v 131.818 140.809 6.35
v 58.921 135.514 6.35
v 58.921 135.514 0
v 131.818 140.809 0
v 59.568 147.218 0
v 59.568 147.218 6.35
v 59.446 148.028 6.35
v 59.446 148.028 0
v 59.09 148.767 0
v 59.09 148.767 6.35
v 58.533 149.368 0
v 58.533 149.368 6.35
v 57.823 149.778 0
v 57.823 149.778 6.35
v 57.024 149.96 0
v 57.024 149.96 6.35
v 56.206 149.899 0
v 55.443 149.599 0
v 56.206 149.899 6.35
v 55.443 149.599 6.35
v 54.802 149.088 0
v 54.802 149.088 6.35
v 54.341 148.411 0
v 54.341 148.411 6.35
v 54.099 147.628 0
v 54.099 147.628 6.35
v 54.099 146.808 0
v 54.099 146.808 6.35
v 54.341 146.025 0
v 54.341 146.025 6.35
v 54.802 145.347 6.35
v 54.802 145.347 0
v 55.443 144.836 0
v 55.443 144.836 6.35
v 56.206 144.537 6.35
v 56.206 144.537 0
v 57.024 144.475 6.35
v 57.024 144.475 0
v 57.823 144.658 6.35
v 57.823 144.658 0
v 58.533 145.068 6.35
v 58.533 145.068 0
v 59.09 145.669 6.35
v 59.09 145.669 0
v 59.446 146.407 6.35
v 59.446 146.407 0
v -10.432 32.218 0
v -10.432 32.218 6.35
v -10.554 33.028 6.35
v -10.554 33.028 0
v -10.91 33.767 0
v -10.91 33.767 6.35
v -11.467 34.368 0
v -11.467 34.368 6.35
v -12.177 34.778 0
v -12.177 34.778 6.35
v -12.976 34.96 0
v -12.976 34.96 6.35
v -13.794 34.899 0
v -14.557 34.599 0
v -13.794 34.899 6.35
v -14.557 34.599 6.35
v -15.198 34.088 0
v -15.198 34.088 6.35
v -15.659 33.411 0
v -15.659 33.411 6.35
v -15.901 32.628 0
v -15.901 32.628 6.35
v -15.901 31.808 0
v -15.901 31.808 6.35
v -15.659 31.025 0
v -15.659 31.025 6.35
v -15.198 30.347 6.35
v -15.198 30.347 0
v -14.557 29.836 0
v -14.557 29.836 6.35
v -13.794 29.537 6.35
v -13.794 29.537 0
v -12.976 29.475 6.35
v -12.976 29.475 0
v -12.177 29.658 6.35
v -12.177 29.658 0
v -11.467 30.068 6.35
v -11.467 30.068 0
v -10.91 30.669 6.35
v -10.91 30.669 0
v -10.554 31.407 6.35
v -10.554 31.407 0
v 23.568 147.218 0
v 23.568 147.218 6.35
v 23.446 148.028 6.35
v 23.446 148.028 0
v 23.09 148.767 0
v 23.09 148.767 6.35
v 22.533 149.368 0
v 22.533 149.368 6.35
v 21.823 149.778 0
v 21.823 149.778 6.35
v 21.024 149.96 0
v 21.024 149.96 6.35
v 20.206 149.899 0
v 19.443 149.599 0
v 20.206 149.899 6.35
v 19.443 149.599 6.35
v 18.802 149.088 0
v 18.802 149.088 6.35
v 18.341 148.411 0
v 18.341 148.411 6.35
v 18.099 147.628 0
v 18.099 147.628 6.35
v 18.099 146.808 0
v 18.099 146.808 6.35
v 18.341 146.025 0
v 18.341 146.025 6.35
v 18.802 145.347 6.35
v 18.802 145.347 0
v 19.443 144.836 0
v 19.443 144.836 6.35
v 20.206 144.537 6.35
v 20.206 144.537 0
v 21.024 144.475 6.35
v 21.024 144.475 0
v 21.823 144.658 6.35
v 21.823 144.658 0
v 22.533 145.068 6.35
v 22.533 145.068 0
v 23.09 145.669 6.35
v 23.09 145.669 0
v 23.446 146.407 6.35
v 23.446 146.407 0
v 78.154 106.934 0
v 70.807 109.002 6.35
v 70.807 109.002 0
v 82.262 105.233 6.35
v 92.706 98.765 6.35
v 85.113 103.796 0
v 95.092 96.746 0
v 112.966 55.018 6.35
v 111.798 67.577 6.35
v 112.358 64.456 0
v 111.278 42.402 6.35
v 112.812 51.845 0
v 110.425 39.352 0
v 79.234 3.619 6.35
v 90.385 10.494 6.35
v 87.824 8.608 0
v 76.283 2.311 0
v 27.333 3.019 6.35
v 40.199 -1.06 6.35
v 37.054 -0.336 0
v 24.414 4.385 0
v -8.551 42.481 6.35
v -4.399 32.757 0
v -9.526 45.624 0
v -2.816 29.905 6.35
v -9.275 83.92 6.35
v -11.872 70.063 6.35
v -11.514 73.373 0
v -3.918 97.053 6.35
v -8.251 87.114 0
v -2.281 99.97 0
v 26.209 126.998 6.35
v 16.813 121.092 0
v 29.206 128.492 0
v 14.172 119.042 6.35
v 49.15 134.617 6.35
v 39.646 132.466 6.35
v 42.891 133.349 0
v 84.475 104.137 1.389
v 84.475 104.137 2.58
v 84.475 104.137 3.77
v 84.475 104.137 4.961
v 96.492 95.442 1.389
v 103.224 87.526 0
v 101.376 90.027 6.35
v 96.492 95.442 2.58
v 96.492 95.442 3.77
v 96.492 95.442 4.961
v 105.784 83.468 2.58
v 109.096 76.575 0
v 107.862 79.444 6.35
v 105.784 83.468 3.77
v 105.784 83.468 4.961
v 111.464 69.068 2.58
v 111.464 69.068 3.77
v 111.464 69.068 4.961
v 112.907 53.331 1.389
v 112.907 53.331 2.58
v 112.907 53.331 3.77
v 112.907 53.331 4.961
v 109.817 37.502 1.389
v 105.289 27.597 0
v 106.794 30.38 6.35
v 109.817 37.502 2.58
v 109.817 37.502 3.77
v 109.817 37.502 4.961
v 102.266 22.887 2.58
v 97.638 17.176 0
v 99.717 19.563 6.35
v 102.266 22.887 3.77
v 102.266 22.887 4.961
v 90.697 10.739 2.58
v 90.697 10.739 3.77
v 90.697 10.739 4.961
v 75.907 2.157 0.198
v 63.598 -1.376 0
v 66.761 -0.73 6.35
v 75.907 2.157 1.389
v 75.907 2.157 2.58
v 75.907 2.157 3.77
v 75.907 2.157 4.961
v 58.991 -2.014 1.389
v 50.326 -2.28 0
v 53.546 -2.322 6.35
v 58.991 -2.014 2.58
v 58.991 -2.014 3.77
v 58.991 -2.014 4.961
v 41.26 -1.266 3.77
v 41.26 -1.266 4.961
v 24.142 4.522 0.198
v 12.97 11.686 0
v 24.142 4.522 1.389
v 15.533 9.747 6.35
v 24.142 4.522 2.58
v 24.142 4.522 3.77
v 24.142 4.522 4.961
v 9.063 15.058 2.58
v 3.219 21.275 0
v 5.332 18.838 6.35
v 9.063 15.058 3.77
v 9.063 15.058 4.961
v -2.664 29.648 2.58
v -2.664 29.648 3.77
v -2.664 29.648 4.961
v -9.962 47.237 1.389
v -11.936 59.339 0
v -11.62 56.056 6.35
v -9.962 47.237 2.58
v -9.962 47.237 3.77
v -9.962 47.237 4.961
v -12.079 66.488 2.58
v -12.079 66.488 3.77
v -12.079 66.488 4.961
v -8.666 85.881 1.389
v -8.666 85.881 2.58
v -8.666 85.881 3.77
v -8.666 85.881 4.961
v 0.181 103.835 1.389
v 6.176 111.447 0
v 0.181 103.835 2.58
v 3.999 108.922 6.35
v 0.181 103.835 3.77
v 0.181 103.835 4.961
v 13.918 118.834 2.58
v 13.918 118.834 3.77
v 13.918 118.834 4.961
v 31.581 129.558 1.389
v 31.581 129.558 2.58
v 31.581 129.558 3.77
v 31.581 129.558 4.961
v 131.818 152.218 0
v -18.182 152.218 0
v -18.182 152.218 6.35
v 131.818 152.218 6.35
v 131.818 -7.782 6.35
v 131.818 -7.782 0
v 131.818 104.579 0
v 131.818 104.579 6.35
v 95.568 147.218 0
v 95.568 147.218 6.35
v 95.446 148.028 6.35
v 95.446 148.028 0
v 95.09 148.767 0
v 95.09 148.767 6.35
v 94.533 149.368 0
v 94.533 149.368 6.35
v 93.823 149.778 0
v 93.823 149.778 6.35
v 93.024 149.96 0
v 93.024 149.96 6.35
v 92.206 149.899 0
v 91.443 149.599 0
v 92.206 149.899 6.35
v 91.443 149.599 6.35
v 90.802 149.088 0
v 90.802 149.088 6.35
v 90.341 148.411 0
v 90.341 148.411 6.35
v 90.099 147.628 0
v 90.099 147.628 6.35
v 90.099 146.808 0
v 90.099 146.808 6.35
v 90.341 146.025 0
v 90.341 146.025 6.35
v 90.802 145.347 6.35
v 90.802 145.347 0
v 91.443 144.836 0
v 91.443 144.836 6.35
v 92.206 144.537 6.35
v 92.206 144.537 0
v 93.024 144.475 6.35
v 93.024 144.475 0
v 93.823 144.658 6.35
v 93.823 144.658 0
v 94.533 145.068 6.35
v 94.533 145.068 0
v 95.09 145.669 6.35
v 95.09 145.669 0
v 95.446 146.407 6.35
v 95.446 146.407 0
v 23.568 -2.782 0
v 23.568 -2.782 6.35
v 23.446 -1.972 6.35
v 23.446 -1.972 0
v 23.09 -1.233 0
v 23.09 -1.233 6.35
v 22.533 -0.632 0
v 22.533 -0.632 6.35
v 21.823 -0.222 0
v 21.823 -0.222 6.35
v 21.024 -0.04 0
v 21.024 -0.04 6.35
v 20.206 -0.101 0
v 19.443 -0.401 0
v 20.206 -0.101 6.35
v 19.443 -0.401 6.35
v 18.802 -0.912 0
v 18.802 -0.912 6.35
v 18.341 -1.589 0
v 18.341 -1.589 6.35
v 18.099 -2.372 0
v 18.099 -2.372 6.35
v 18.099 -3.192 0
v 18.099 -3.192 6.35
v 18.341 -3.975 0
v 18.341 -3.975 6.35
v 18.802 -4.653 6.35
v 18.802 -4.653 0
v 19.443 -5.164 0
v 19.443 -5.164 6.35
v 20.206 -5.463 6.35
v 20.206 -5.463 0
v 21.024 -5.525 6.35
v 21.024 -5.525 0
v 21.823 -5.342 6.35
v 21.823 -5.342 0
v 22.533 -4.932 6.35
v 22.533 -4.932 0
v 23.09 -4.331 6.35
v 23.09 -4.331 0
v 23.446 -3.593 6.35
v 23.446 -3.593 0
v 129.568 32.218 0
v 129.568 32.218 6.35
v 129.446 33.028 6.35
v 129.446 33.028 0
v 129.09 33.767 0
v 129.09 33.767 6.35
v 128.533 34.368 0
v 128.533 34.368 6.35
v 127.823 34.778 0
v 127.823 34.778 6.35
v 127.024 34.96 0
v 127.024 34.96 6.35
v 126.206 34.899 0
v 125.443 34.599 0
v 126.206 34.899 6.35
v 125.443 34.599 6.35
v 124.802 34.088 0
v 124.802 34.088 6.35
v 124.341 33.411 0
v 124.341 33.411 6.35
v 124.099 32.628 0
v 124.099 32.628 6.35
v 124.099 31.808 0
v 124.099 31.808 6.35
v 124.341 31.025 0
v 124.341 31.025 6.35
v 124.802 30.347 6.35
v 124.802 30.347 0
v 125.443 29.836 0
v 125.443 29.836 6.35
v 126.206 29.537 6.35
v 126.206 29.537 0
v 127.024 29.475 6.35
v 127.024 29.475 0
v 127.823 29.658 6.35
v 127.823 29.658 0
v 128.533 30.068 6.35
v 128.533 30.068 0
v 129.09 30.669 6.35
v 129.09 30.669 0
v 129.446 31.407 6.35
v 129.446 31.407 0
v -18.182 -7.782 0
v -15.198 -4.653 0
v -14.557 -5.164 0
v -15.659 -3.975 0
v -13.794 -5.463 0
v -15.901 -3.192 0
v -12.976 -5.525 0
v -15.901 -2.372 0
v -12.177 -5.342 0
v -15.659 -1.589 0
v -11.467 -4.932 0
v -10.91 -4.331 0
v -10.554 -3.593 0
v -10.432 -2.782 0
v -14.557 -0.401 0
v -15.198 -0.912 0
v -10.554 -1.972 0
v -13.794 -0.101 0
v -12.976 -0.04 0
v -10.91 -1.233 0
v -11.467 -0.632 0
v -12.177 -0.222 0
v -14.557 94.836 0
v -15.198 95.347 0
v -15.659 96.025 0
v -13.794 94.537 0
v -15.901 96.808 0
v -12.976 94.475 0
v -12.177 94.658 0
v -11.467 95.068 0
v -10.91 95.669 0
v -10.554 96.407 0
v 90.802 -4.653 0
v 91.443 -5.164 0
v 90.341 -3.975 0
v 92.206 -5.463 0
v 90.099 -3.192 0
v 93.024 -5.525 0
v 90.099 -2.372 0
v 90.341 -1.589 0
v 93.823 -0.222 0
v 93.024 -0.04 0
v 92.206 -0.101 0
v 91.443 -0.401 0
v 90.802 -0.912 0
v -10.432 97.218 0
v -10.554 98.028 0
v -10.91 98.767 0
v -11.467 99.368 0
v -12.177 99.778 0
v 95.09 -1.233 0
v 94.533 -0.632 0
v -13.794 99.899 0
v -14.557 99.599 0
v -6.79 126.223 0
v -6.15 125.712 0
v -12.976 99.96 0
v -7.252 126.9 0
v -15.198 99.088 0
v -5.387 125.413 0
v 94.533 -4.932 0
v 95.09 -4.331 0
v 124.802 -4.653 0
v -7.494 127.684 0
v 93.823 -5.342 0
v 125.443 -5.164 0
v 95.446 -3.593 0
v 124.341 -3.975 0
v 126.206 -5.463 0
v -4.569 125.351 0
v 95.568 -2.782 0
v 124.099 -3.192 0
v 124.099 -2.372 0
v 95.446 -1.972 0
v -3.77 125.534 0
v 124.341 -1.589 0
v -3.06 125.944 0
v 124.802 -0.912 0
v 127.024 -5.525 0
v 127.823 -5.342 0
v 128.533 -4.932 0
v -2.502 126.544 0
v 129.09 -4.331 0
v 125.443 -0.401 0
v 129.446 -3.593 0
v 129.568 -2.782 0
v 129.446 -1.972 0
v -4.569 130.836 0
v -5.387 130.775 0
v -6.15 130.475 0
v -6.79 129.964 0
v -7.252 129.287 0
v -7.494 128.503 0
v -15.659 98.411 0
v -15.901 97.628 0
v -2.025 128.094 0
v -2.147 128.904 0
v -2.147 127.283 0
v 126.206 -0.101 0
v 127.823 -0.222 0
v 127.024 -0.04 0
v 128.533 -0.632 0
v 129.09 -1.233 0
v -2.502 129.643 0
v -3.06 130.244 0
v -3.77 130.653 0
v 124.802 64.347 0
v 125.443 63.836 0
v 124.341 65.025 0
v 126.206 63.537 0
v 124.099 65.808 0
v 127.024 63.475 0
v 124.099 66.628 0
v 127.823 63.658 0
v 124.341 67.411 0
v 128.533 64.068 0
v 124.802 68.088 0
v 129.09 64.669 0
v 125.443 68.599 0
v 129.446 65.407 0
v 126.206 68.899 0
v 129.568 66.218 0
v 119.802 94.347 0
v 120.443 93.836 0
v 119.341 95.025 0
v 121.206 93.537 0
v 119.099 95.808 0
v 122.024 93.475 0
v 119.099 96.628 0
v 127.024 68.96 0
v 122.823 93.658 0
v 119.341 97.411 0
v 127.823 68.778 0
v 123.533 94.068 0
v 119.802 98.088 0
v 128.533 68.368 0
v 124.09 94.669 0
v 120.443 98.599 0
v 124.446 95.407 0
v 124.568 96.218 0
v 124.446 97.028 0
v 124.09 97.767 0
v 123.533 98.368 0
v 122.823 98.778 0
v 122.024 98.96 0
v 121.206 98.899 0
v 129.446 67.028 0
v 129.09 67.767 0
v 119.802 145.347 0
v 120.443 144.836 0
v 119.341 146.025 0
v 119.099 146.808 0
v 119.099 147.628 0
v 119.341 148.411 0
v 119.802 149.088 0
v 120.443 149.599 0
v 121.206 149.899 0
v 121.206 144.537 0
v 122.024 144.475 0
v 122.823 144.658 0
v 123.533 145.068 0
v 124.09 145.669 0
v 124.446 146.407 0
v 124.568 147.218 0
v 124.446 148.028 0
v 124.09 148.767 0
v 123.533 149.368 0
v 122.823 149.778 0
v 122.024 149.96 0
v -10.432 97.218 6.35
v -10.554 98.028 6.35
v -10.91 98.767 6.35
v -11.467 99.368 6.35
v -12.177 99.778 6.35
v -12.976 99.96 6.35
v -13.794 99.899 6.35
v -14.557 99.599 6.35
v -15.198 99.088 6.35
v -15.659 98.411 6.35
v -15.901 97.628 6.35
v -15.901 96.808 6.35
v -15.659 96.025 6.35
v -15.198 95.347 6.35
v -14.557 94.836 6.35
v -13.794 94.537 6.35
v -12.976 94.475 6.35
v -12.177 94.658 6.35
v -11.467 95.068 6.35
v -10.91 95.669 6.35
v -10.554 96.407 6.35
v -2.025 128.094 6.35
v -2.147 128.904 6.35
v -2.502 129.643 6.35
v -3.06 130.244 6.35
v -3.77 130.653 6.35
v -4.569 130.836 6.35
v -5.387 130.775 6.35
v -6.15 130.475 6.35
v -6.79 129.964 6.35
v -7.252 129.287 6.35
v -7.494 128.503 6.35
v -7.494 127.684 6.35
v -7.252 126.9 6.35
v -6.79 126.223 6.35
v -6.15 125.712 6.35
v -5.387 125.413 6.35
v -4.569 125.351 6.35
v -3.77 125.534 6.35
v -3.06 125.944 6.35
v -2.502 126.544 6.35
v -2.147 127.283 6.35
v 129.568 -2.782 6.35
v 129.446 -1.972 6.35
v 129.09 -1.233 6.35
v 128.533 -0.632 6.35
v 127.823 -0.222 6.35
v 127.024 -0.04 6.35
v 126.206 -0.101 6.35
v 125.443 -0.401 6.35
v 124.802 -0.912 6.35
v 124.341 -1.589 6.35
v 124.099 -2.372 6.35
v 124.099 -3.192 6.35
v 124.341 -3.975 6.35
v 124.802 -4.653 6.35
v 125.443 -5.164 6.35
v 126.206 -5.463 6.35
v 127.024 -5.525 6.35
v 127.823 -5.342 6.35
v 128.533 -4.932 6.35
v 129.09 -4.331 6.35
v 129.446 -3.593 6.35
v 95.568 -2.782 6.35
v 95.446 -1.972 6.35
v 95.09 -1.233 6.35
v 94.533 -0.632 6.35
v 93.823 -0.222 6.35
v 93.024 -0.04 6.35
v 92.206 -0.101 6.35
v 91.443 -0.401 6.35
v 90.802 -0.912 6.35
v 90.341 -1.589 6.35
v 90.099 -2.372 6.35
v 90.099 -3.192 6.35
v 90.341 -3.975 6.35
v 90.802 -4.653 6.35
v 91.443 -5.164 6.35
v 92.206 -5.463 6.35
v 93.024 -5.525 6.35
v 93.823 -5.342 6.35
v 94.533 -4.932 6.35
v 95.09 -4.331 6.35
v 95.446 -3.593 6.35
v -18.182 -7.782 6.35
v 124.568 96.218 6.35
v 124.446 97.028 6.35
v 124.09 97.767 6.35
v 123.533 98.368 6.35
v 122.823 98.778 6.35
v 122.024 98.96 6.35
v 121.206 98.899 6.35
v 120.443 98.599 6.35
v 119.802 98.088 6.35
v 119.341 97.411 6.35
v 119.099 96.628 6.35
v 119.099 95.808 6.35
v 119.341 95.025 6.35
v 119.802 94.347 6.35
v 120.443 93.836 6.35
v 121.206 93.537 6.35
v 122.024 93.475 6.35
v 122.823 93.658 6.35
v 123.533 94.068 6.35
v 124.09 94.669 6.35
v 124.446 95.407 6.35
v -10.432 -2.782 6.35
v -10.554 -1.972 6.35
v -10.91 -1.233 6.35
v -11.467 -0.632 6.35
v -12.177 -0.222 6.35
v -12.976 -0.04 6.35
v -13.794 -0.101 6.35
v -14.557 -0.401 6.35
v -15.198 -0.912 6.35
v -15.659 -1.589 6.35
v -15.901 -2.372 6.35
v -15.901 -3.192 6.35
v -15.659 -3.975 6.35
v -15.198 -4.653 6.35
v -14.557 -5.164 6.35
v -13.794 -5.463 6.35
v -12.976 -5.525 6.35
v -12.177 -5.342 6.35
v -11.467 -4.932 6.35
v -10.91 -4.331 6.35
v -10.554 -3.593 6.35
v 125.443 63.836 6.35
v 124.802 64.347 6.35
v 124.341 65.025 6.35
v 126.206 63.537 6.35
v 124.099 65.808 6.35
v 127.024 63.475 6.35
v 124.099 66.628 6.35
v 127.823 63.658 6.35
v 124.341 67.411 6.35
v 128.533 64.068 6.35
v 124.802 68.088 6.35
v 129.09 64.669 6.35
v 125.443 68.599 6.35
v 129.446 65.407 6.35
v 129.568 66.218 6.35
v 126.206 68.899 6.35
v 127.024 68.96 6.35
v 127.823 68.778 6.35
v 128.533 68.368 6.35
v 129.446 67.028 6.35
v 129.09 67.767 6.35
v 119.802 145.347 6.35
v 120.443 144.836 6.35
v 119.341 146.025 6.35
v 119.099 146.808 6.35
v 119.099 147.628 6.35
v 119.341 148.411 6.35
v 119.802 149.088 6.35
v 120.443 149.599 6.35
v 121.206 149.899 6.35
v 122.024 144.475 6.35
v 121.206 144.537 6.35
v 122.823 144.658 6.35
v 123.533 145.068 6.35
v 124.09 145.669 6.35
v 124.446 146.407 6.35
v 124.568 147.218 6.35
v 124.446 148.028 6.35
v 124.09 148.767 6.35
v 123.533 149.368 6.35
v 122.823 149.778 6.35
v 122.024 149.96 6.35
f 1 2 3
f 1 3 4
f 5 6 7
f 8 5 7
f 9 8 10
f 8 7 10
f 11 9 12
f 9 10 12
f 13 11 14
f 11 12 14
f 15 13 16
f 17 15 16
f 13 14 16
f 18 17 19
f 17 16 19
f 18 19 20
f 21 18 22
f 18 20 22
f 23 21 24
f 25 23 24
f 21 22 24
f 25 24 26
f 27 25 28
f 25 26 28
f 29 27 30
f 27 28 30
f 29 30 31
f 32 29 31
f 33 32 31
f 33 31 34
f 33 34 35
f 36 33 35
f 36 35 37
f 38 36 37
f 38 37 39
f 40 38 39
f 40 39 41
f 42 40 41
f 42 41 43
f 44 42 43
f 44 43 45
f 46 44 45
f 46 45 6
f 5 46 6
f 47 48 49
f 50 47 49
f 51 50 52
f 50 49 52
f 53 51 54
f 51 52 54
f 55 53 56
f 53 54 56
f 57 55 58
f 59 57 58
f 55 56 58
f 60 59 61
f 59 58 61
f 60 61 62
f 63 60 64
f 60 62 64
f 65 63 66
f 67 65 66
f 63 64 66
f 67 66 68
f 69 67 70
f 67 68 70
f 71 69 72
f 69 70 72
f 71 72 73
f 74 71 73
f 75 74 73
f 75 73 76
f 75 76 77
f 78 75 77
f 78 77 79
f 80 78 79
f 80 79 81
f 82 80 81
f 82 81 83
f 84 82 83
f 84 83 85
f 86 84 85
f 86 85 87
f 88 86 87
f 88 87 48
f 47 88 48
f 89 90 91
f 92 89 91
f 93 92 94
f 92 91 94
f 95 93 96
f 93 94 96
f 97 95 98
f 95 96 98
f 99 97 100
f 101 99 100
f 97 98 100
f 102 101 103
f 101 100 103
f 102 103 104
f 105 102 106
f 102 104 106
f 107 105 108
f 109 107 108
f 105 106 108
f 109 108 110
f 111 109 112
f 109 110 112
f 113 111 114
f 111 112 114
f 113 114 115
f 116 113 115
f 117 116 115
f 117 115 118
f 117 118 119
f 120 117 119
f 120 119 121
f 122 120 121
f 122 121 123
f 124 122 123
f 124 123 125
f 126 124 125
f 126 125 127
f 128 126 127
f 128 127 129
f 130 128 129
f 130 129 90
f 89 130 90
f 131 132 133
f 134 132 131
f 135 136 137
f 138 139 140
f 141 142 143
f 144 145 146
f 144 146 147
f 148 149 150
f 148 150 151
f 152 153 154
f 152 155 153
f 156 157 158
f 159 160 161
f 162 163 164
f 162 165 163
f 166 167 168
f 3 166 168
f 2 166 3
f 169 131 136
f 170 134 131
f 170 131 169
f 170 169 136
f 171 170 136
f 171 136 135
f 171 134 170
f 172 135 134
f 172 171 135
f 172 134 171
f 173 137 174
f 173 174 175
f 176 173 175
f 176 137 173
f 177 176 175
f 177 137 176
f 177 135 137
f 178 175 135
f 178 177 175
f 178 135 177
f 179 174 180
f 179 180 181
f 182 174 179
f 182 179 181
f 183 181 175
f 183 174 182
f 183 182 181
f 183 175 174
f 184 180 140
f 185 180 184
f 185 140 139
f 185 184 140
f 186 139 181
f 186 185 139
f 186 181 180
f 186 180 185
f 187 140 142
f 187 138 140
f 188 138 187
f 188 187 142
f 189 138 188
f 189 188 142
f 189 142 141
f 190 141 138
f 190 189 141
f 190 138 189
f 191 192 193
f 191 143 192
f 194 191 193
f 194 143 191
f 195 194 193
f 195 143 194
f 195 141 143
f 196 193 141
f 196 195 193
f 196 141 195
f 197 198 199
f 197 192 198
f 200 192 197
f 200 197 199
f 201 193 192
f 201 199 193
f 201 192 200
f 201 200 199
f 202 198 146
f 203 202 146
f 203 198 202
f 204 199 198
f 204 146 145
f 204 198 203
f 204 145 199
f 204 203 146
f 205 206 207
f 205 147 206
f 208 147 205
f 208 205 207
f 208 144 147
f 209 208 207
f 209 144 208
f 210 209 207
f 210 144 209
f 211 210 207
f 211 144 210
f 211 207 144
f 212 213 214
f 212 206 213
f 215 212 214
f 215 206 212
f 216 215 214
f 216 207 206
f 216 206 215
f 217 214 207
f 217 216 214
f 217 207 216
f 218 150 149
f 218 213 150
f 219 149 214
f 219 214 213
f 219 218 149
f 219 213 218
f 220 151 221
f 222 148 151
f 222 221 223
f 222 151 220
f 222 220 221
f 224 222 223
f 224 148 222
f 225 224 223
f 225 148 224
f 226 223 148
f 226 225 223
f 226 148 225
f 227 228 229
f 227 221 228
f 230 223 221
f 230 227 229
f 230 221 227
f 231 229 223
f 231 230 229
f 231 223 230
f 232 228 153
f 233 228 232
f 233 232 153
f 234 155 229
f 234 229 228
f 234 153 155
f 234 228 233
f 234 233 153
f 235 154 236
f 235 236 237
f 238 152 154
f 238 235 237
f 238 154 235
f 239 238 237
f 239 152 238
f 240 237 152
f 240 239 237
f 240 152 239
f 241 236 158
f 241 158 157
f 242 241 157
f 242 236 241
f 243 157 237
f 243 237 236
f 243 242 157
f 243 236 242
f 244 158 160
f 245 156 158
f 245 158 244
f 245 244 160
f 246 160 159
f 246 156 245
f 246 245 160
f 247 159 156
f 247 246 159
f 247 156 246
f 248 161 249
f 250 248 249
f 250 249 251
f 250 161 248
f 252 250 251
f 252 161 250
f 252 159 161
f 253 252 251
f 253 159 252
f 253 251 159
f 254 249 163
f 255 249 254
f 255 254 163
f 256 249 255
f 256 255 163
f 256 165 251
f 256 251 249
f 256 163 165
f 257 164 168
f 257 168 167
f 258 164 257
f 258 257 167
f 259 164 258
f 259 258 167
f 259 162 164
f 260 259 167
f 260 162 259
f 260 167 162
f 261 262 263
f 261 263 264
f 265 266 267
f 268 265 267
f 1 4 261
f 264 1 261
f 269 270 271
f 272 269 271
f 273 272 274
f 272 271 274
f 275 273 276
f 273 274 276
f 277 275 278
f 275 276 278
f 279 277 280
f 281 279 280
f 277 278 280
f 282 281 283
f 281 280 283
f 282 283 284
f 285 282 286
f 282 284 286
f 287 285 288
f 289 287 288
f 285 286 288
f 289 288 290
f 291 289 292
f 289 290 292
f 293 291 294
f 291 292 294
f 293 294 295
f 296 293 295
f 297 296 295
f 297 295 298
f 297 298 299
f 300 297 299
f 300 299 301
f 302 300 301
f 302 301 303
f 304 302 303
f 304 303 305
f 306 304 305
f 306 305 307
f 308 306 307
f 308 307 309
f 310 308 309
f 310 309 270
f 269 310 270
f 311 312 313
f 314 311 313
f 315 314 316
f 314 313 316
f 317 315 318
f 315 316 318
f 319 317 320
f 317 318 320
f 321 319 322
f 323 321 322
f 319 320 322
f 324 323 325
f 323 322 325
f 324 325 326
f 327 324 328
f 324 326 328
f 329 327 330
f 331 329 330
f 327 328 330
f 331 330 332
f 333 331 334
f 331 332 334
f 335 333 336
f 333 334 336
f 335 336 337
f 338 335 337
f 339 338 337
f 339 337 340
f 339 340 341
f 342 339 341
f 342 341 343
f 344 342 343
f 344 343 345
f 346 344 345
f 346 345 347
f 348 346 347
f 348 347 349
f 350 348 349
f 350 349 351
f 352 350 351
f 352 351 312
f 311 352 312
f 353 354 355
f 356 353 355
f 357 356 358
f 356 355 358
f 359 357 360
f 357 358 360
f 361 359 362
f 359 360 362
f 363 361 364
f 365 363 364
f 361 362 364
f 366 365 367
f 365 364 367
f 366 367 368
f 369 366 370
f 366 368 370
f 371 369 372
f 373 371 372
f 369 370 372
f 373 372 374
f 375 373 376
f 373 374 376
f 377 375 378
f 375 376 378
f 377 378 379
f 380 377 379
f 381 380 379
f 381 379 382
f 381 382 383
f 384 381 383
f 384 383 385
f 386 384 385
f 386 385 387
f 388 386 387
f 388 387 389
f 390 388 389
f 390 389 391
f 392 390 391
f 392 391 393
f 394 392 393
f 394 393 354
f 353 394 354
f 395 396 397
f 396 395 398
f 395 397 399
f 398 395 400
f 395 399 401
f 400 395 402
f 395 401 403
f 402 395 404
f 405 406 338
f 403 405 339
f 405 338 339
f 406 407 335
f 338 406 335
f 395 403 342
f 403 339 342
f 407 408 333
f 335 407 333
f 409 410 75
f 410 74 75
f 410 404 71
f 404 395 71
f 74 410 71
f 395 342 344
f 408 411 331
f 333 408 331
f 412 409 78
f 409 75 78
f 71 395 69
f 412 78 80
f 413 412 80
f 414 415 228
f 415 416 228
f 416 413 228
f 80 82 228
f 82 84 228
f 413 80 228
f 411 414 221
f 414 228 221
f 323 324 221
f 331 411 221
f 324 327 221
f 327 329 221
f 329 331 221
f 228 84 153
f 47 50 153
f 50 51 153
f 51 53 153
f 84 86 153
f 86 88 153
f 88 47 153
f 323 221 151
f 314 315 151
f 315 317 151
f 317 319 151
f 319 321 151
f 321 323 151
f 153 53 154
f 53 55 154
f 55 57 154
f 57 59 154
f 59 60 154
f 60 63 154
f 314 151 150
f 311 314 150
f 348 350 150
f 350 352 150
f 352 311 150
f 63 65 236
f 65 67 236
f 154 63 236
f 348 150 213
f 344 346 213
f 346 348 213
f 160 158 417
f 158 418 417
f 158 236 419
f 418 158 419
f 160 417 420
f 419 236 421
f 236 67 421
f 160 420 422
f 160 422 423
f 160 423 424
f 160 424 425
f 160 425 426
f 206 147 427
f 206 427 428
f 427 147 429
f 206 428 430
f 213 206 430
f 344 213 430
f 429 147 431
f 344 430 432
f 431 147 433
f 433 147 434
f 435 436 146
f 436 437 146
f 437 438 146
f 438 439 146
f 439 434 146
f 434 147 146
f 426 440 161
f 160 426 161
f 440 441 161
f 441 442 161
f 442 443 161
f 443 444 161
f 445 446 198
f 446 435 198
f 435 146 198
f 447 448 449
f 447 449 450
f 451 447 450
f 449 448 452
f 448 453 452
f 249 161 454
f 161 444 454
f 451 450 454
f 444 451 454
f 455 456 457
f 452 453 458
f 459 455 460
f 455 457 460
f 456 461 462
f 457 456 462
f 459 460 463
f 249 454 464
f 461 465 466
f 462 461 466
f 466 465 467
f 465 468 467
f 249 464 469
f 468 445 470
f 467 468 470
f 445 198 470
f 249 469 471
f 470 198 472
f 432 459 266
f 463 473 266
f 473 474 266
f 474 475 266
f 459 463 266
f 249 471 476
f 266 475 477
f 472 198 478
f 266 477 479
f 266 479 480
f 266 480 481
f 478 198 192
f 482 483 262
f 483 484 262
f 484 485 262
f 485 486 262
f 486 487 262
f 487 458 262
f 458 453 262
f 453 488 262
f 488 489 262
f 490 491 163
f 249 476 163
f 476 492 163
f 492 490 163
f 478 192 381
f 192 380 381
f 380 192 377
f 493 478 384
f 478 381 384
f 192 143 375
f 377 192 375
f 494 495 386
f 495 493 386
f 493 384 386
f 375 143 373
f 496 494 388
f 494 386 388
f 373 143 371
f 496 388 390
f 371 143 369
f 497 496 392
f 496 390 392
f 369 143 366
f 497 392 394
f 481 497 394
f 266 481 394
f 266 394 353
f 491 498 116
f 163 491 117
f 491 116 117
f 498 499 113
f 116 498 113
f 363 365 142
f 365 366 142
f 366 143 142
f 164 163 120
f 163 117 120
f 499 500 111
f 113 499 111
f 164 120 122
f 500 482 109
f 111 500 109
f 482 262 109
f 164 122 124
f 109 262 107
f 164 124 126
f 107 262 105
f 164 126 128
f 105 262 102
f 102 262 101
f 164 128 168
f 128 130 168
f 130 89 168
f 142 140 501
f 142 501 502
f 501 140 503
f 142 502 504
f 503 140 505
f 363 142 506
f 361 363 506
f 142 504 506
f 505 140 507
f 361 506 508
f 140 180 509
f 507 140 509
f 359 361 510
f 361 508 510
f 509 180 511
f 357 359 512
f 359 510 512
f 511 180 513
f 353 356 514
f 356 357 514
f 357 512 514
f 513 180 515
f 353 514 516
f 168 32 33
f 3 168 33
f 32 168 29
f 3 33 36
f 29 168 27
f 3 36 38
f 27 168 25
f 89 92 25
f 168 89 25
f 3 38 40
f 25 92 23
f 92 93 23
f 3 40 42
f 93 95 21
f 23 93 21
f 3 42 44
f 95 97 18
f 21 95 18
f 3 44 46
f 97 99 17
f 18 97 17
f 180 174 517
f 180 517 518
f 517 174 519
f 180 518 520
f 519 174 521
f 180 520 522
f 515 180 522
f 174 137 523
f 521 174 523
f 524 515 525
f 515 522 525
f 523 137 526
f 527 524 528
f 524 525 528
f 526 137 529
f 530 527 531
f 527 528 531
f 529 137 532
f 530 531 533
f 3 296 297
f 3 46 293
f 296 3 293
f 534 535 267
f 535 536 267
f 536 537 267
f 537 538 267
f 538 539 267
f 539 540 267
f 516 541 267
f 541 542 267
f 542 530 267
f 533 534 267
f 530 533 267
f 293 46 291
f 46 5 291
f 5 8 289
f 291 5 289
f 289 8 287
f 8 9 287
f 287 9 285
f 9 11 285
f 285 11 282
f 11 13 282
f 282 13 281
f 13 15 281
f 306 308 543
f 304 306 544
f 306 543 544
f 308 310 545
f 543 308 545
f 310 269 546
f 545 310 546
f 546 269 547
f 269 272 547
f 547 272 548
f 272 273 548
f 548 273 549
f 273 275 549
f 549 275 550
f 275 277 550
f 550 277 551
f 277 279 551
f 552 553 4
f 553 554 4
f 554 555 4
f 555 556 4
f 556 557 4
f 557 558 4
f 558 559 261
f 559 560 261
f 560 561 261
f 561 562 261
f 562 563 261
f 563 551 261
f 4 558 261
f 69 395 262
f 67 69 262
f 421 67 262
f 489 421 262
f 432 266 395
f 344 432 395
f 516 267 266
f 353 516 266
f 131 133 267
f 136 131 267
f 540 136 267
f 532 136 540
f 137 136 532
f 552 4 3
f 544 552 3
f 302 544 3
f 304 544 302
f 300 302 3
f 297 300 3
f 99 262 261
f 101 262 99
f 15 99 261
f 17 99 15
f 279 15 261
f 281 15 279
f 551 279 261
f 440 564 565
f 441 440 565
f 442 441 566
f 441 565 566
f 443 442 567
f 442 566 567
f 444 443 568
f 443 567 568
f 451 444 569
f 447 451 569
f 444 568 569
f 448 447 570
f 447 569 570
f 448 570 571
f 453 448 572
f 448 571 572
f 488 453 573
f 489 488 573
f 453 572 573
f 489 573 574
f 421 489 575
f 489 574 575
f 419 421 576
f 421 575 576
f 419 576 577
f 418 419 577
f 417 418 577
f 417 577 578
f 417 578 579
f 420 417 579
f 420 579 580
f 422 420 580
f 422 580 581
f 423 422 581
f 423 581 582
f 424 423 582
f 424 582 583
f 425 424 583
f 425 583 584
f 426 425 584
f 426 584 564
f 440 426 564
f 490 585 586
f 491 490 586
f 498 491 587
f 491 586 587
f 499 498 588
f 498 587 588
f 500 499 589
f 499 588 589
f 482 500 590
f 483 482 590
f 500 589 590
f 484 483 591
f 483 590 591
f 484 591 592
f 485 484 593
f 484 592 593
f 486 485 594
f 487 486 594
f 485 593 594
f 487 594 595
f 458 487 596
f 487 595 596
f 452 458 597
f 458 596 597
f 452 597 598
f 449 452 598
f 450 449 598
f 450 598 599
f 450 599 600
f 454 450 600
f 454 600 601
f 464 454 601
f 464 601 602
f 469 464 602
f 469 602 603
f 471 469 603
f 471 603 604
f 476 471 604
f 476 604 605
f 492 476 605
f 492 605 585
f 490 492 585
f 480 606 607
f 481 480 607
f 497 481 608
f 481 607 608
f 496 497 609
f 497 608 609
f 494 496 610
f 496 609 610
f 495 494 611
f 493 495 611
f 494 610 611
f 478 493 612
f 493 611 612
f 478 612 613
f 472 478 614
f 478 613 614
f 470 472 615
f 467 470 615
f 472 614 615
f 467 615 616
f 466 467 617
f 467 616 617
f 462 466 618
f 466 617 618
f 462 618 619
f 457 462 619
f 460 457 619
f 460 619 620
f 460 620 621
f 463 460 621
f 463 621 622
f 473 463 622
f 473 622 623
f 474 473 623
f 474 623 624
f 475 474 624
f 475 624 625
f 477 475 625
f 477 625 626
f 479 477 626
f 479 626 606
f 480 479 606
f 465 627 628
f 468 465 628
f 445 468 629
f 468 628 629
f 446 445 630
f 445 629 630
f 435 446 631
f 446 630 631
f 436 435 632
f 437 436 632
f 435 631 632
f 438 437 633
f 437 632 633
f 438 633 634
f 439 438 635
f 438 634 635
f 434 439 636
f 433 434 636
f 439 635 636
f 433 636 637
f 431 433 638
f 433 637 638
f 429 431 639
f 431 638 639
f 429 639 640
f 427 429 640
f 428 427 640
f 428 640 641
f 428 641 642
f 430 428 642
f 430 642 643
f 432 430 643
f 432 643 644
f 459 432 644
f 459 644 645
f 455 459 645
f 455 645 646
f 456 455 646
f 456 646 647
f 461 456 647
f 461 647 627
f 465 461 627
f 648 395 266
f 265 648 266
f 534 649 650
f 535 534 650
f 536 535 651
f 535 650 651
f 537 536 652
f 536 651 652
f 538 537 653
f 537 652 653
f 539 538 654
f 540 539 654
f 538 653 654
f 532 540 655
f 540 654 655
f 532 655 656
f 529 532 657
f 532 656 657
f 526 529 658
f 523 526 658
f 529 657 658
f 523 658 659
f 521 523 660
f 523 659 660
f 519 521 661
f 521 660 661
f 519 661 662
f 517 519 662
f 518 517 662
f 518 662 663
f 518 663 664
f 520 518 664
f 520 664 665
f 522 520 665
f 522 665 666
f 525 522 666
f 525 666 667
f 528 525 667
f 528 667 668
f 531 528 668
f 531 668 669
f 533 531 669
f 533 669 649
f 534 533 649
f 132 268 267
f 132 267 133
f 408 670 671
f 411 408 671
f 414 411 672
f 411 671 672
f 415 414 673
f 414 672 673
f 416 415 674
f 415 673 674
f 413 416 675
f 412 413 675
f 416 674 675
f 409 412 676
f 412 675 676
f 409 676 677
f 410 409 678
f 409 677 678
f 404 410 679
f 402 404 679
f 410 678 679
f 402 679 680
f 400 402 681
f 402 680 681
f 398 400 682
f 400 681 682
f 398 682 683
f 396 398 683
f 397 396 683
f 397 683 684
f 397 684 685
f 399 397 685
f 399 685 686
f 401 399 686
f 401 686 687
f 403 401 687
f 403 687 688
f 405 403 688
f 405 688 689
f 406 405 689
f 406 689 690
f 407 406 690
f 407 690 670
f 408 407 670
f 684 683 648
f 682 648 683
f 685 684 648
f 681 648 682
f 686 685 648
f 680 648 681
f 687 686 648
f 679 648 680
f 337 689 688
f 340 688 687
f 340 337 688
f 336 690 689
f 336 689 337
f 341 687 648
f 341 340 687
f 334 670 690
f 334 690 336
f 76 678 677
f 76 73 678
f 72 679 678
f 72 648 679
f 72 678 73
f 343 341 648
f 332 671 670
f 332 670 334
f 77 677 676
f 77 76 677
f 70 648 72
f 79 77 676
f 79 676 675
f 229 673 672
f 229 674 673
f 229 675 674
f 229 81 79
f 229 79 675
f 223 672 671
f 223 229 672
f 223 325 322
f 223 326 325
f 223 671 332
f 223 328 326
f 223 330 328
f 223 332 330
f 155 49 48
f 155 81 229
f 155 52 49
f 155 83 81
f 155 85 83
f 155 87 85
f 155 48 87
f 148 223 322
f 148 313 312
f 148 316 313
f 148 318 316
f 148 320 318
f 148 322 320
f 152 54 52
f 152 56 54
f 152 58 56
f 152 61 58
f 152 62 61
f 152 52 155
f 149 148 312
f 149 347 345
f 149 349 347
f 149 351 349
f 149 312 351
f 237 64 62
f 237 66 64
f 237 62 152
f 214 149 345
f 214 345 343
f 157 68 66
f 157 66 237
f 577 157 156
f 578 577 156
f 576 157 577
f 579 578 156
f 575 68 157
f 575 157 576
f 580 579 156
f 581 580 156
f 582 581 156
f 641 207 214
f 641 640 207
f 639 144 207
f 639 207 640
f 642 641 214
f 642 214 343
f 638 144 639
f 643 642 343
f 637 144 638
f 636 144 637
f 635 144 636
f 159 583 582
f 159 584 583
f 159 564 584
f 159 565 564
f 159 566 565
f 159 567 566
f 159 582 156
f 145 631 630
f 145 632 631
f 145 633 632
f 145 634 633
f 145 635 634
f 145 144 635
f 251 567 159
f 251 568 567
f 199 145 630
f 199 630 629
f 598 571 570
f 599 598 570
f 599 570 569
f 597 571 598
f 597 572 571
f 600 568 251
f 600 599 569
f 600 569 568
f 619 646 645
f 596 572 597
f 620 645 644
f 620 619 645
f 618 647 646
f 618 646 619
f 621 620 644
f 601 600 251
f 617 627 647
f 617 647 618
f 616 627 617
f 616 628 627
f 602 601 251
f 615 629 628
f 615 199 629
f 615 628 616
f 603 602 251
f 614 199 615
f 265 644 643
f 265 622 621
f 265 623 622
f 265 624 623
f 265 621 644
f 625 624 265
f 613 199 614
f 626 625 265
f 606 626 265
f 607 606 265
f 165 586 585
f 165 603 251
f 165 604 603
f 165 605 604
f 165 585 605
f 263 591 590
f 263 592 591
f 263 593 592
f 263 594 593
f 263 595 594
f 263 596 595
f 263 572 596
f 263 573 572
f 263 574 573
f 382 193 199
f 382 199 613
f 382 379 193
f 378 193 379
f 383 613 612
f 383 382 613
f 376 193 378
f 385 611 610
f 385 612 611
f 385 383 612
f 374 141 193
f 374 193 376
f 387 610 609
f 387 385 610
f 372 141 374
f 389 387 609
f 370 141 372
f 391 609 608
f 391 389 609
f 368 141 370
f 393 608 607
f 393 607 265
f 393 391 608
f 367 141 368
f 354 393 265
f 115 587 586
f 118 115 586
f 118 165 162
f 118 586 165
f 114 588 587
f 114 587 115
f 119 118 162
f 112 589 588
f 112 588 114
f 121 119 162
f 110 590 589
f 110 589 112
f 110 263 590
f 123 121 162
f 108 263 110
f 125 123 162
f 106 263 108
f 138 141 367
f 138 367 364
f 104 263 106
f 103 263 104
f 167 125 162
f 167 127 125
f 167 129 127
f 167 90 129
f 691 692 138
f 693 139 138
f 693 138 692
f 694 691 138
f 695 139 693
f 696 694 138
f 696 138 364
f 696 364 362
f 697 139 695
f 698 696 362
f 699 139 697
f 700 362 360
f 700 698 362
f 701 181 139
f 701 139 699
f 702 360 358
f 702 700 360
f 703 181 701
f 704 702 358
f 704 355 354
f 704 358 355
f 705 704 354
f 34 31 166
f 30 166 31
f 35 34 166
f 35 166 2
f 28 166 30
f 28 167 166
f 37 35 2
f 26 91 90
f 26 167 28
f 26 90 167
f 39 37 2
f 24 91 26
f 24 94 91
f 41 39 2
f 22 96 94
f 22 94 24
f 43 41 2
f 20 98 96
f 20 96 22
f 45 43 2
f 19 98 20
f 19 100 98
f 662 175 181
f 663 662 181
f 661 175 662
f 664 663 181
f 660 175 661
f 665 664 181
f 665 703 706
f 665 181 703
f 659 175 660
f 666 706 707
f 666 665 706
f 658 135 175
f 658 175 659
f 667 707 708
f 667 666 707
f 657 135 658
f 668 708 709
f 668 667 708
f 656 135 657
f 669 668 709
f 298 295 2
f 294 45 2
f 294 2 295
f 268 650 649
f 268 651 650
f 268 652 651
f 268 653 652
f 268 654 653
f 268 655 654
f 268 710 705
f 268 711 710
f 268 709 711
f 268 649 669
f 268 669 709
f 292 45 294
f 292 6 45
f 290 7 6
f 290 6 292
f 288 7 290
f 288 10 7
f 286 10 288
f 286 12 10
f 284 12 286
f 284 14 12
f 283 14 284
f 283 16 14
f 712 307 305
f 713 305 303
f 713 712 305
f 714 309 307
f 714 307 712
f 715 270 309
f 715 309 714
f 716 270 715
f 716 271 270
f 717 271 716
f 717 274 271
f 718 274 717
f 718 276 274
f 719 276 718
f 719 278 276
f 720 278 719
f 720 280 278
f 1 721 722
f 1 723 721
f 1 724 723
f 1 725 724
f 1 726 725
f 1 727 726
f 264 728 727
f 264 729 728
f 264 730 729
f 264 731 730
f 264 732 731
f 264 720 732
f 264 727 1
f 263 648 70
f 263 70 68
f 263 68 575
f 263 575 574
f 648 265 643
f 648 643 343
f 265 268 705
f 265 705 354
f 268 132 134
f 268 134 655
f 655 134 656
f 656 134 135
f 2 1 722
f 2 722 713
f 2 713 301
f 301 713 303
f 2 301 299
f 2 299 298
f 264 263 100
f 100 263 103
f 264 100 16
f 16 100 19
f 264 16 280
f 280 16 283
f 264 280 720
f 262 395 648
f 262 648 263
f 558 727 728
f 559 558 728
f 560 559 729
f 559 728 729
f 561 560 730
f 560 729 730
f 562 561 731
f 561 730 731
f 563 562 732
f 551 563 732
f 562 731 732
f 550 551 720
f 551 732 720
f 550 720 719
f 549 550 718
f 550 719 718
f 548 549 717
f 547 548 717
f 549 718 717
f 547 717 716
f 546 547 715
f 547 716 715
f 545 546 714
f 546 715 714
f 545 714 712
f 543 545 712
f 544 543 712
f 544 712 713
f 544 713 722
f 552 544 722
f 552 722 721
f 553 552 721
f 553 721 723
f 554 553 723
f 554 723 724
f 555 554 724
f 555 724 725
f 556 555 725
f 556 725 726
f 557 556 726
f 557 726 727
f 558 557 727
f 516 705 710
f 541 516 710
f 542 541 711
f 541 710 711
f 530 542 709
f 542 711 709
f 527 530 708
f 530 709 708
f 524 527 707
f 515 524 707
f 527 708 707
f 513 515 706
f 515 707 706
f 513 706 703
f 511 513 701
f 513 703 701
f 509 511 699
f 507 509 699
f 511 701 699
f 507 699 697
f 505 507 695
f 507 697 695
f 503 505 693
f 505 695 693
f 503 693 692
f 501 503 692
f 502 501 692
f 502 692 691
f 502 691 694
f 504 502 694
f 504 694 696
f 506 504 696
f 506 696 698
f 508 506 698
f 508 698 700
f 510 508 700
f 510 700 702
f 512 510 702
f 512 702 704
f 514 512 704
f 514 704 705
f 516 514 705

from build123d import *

# Parameters (mm, degrees)
SKETCH1_W           = 150
SKETCH1_H           = 160
BOSS_EXTRUDE1_DEPTH = 6.35
CUT_EXTRUDE2_REACH  = 8.35
SKETCH2_R           = 50
CUT_EXTRUDE3_REACH  = 8.35
CUT_EXTRUDE4_REACH  = 8.35
SKETCH9_R           = 2.75


with BuildPart() as part:
    # Sketch1 → Boss-Extrude1 (new body)
    with BuildSketch(Plane.XY):
        with Locations((56.818174671, 72.21769967)):
            Rectangle(SKETCH1_W, SKETCH1_H)
    extrude(amount=BOSS_EXTRUDE1_DEPTH)

    # Sketch2 → Cut-Extrude2 (cut, up to next)
    with BuildSketch(Plane.XY, mode=Mode.PRIVATE) as cut_extrude2_sk1:
        with Locations((56.818174671, 60.21769967)):
            Circle(SKETCH2_R)
    cut_extrude2_tool1 = extrude(cut_extrude2_sk1.sketch, amount=CUT_EXTRUDE2_REACH, mode=Mode.PRIVATE) & part.part
    add(cut_extrude2_tool1.solids().sort_by_distance((56.818175, 60.2177, 0))[0], mode=Mode.SUBTRACT)

    # Sketch8 → Cut-Extrude3 (cut, up to next)
    with BuildSketch(Plane.XY.offset(6.35), mode=Mode.PRIVATE) as cut_extrude3_sk1:
        with BuildLine():
            Line((58.92140003, 135.514331195), (131.818174671, 140.809388743))
            Line((131.818174671, 140.809388743), (131.818174671, 104.578808843))
            Line((131.818174671, 104.578808843), (70.806770479, 109.001730739))
            add(Edge.make_bspline(
                [(70.806770479, 109.001730739), (73.942524714, 108.368884336), (77.04178439, 107.432911602), (83.051183235, 104.970960127), (85.961176799, 103.444994734), (91.479272622, 99.84171719), (94.08723275, 97.764446671), (98.896476379, 93.118835241), (101.097626722, 90.550563372), (105.000601765, 85.003178114), (106.702307564, 82.024159237), (109.529682116, 75.752999351), (110.655251092, 72.460975365), (112.272876974, 65.675829551), (112.764857474, 62.18284337), (113.079726502, 55.118296179), (112.902565452, 51.546884758), (111.867369097, 44.454211174), (111.009313557, 40.93310722), (108.625399649, 34.071335338), (107.099551849, 30.730828472), (103.418128221, 24.357288168), (101.262594088, 21.324412639), (96.384092178, 15.685114778), (93.661196375, 13.078841183), (87.732775622, 8.399046081), (84.527350913, 6.325658336), (77.738594716, 2.80099297), (74.155388616, 1.34982877), (66.732312128, -0.861700607), (62.892588137, -1.621977418), (55.090144524, -2.406756839), (51.127587291, -2.431200011), (43.220919756, -1.725282069), (39.276982107, -0.994893308), (31.551721516, 1.212456983), (27.77057526, 2.689412638), (20.512525514, 6.354071351), (17.035796228, 8.541734506), (10.520379708, 13.56507488), (7.481857639, 16.400678926), (1.963709861, 22.631960147), (-0.515766072, 26.027532897), (-4.812661012, 33.268276111), (-6.629951535, 37.113314132), (-9.521205366, 45.123544829), (-10.595066712, 49.288581387), (-11.94355863, 57.794744944), (-12.218118102, 62.135697466), (-11.940081486, 70.8399882), (-11.387448434, 75.203139684), (-9.456713485, 83.793925735), (-8.078610826, 88.021368007), (-4.52880765, 96.184347178), (-2.357143331, 100.119693237), (2.718257783, 107.549380476), (5.621922023, 111.043539373), (12.071778181, 117.454666429), (15.617863156, 120.371467783), (23.237698029, 125.509870744), (27.311309881, 127.731327501), (35.849706709, 131.383908814), (40.314327037, 132.814916259), (49.481179121, 134.818294383), (54.183225201, 135.390580553), (58.92140003, 135.514331195)],
                knots=[0, 0, 0, 0, 0.03125, 0.03125, 0.0625, 0.0625, 0.09375, 0.09375, 0.125, 0.125, 0.15625, 0.15625, 0.1875, 0.1875, 0.21875, 0.21875, 0.25, 0.25, 0.28125, 0.28125, 0.3125, 0.3125, 0.34375, 0.34375, 0.375, 0.375, 0.40625, 0.40625, 0.4375, 0.4375, 0.46875, 0.46875, 0.5, 0.5, 0.53125, 0.53125, 0.5625, 0.5625, 0.59375, 0.59375, 0.625, 0.625, 0.65625, 0.65625, 0.6875, 0.6875, 0.71875, 0.71875, 0.75, 0.75, 0.78125, 0.78125, 0.8125, 0.8125, 0.84375, 0.84375, 0.875, 0.875, 0.90625, 0.90625, 0.9375, 0.9375, 0.96875, 0.96875, 1, 1, 1, 1], degree=3))
        make_face()
    cut_extrude3_tool1 = extrude(cut_extrude3_sk1.sketch, amount=-CUT_EXTRUDE3_REACH, mode=Mode.PRIVATE) & part.part
    add(cut_extrude3_tool1.solids().sort_by_distance((56.233786, 70.895416, 6.35))[0], mode=Mode.SUBTRACT)

    # Sketch9 → Cut-Extrude4 (cut, up to next)
    with BuildSketch(Plane.XY.offset(6.35), mode=Mode.PRIVATE) as cut_extrude4_sk1:
        with Locations((121.818174671, 147.21769967)):
            Circle(SKETCH9_R)
    cut_extrude4_tool1 = extrude(cut_extrude4_sk1.sketch, amount=-CUT_EXTRUDE4_REACH, mode=Mode.PRIVATE) & part.part
    add(cut_extrude4_tool1.solids().sort_by_distance((121.818175, 147.2177, 6.35))[0], mode=Mode.SUBTRACT)
    # Sketch9 → Cut-Extrude4 (cut, up to next)
    with BuildSketch(Plane.XY.offset(6.35), mode=Mode.PRIVATE) as cut_extrude4_sk2:
        with Locations((92.818174671, 147.21769967)):
            Circle(SKETCH9_R)
    cut_extrude4_tool2 = extrude(cut_extrude4_sk2.sketch, amount=-CUT_EXTRUDE4_REACH, mode=Mode.PRIVATE) & part.part
    add(cut_extrude4_tool2.solids().sort_by_distance((92.818175, 147.2177, 6.35))[0], mode=Mode.SUBTRACT)
    # Sketch9 → Cut-Extrude4 (cut, up to next)
    with BuildSketch(Plane.XY.offset(6.35), mode=Mode.PRIVATE) as cut_extrude4_sk3:
        with Locations((56.818174671, 147.21769967)):
            Circle(SKETCH9_R)
    cut_extrude4_tool3 = extrude(cut_extrude4_sk3.sketch, amount=-CUT_EXTRUDE4_REACH, mode=Mode.PRIVATE) & part.part
    add(cut_extrude4_tool3.solids().sort_by_distance((56.818175, 147.2177, 6.35))[0], mode=Mode.SUBTRACT)
    # Sketch9 → Cut-Extrude4 (cut, up to next)
    with BuildSketch(Plane.XY.offset(6.35), mode=Mode.PRIVATE) as cut_extrude4_sk4:
        with Locations((20.818174671, 147.21769967)):
            Circle(SKETCH9_R)
    cut_extrude4_tool4 = extrude(cut_extrude4_sk4.sketch, amount=-CUT_EXTRUDE4_REACH, mode=Mode.PRIVATE) & part.part
    add(cut_extrude4_tool4.solids().sort_by_distance((20.818175, 147.2177, 6.35))[0], mode=Mode.SUBTRACT)
    # Sketch9 → Cut-Extrude4 (cut, up to next)
    with BuildSketch(Plane.XY.offset(6.35), mode=Mode.PRIVATE) as cut_extrude4_sk5:
        with Locations((-4.774596198, 128.093555907)):
            Circle(SKETCH9_R)
    cut_extrude4_tool5 = extrude(cut_extrude4_sk5.sketch, amount=-CUT_EXTRUDE4_REACH, mode=Mode.PRIVATE) & part.part
    add(cut_extrude4_tool5.solids().sort_by_distance((-4.774596, 128.093556, 6.35))[0], mode=Mode.SUBTRACT)
    # Sketch9 → Cut-Extrude4 (cut, up to next)
    with BuildSketch(Plane.XY.offset(6.35), mode=Mode.PRIVATE) as cut_extrude4_sk6:
        with Locations((-13.181825329, 97.21769967)):
            Circle(SKETCH9_R)
    cut_extrude4_tool6 = extrude(cut_extrude4_sk6.sketch, amount=-CUT_EXTRUDE4_REACH, mode=Mode.PRIVATE) & part.part
    add(cut_extrude4_tool6.solids().sort_by_distance((-13.181825, 97.2177, 6.35))[0], mode=Mode.SUBTRACT)
    # Sketch9 → Cut-Extrude4 (cut, up to next)
    with BuildSketch(Plane.XY.offset(6.35), mode=Mode.PRIVATE) as cut_extrude4_sk7:
        with Locations((-13.181825329, 32.21769967)):
            Circle(SKETCH9_R)
    cut_extrude4_tool7 = extrude(cut_extrude4_sk7.sketch, amount=-CUT_EXTRUDE4_REACH, mode=Mode.PRIVATE) & part.part
    add(cut_extrude4_tool7.solids().sort_by_distance((-13.181825, 32.2177, 6.35))[0], mode=Mode.SUBTRACT)
    # Sketch9 → Cut-Extrude4 (cut, up to next)
    with BuildSketch(Plane.XY.offset(6.35), mode=Mode.PRIVATE) as cut_extrude4_sk8:
        with Locations((-13.181825329, -2.78230033)):
            Circle(SKETCH9_R)
    cut_extrude4_tool8 = extrude(cut_extrude4_sk8.sketch, amount=-CUT_EXTRUDE4_REACH, mode=Mode.PRIVATE) & part.part
    add(cut_extrude4_tool8.solids().sort_by_distance((-13.181825, -2.7823, 6.35))[0], mode=Mode.SUBTRACT)
    # Sketch9 → Cut-Extrude4 (cut, up to next)
    with BuildSketch(Plane.XY.offset(6.35), mode=Mode.PRIVATE) as cut_extrude4_sk9:
        with Locations((20.818174671, -2.78230033)):
            Circle(SKETCH9_R)
    cut_extrude4_tool9 = extrude(cut_extrude4_sk9.sketch, amount=-CUT_EXTRUDE4_REACH, mode=Mode.PRIVATE) & part.part
    add(cut_extrude4_tool9.solids().sort_by_distance((20.818175, -2.7823, 6.35))[0], mode=Mode.SUBTRACT)
    # Sketch9 → Cut-Extrude4 (cut, up to next)
    with BuildSketch(Plane.XY.offset(6.35), mode=Mode.PRIVATE) as cut_extrude4_sk10:
        with Locations((92.818174671, -2.78230033)):
            Circle(SKETCH9_R)
    cut_extrude4_tool10 = extrude(cut_extrude4_sk10.sketch, amount=-CUT_EXTRUDE4_REACH, mode=Mode.PRIVATE) & part.part
    add(cut_extrude4_tool10.solids().sort_by_distance((92.818175, -2.7823, 6.35))[0], mode=Mode.SUBTRACT)
    # Sketch9 → Cut-Extrude4 (cut, up to next)
    with BuildSketch(Plane.XY.offset(6.35), mode=Mode.PRIVATE) as cut_extrude4_sk11:
        with Locations((126.818174671, -2.78230033)):
            Circle(SKETCH9_R)
    cut_extrude4_tool11 = extrude(cut_extrude4_sk11.sketch, amount=-CUT_EXTRUDE4_REACH, mode=Mode.PRIVATE) & part.part
    add(cut_extrude4_tool11.solids().sort_by_distance((126.818175, -2.7823, 6.35))[0], mode=Mode.SUBTRACT)
    # Sketch9 → Cut-Extrude4 (cut, up to next)
    with BuildSketch(Plane.XY.offset(6.35), mode=Mode.PRIVATE) as cut_extrude4_sk12:
        with Locations((126.818174671, 32.21769967)):
            Circle(SKETCH9_R)
    cut_extrude4_tool12 = extrude(cut_extrude4_sk12.sketch, amount=-CUT_EXTRUDE4_REACH, mode=Mode.PRIVATE) & part.part
    add(cut_extrude4_tool12.solids().sort_by_distance((126.818175, 32.2177, 6.35))[0], mode=Mode.SUBTRACT)
    # Sketch9 → Cut-Extrude4 (cut, up to next)
    with BuildSketch(Plane.XY.offset(6.35), mode=Mode.PRIVATE) as cut_extrude4_sk13:
        with Locations((126.818174671, 66.21769967)):
            Circle(SKETCH9_R)
    cut_extrude4_tool13 = extrude(cut_extrude4_sk13.sketch, amount=-CUT_EXTRUDE4_REACH, mode=Mode.PRIVATE) & part.part
    add(cut_extrude4_tool13.solids().sort_by_distance((126.818175, 66.2177, 6.35))[0], mode=Mode.SUBTRACT)
    # Sketch9 → Cut-Extrude4 (cut, up to next)
    with BuildSketch(Plane.XY.offset(6.35), mode=Mode.PRIVATE) as cut_extrude4_sk14:
        with Locations((121.818174671, 96.21769967)):
            Circle(SKETCH9_R)
    cut_extrude4_tool14 = extrude(cut_extrude4_sk14.sketch, amount=-CUT_EXTRUDE4_REACH, mode=Mode.PRIVATE) & part.part
    add(cut_extrude4_tool14.solids().sort_by_distance((121.818175, 96.2177, 6.35))[0], mode=Mode.SUBTRACT)


solid = part.part
